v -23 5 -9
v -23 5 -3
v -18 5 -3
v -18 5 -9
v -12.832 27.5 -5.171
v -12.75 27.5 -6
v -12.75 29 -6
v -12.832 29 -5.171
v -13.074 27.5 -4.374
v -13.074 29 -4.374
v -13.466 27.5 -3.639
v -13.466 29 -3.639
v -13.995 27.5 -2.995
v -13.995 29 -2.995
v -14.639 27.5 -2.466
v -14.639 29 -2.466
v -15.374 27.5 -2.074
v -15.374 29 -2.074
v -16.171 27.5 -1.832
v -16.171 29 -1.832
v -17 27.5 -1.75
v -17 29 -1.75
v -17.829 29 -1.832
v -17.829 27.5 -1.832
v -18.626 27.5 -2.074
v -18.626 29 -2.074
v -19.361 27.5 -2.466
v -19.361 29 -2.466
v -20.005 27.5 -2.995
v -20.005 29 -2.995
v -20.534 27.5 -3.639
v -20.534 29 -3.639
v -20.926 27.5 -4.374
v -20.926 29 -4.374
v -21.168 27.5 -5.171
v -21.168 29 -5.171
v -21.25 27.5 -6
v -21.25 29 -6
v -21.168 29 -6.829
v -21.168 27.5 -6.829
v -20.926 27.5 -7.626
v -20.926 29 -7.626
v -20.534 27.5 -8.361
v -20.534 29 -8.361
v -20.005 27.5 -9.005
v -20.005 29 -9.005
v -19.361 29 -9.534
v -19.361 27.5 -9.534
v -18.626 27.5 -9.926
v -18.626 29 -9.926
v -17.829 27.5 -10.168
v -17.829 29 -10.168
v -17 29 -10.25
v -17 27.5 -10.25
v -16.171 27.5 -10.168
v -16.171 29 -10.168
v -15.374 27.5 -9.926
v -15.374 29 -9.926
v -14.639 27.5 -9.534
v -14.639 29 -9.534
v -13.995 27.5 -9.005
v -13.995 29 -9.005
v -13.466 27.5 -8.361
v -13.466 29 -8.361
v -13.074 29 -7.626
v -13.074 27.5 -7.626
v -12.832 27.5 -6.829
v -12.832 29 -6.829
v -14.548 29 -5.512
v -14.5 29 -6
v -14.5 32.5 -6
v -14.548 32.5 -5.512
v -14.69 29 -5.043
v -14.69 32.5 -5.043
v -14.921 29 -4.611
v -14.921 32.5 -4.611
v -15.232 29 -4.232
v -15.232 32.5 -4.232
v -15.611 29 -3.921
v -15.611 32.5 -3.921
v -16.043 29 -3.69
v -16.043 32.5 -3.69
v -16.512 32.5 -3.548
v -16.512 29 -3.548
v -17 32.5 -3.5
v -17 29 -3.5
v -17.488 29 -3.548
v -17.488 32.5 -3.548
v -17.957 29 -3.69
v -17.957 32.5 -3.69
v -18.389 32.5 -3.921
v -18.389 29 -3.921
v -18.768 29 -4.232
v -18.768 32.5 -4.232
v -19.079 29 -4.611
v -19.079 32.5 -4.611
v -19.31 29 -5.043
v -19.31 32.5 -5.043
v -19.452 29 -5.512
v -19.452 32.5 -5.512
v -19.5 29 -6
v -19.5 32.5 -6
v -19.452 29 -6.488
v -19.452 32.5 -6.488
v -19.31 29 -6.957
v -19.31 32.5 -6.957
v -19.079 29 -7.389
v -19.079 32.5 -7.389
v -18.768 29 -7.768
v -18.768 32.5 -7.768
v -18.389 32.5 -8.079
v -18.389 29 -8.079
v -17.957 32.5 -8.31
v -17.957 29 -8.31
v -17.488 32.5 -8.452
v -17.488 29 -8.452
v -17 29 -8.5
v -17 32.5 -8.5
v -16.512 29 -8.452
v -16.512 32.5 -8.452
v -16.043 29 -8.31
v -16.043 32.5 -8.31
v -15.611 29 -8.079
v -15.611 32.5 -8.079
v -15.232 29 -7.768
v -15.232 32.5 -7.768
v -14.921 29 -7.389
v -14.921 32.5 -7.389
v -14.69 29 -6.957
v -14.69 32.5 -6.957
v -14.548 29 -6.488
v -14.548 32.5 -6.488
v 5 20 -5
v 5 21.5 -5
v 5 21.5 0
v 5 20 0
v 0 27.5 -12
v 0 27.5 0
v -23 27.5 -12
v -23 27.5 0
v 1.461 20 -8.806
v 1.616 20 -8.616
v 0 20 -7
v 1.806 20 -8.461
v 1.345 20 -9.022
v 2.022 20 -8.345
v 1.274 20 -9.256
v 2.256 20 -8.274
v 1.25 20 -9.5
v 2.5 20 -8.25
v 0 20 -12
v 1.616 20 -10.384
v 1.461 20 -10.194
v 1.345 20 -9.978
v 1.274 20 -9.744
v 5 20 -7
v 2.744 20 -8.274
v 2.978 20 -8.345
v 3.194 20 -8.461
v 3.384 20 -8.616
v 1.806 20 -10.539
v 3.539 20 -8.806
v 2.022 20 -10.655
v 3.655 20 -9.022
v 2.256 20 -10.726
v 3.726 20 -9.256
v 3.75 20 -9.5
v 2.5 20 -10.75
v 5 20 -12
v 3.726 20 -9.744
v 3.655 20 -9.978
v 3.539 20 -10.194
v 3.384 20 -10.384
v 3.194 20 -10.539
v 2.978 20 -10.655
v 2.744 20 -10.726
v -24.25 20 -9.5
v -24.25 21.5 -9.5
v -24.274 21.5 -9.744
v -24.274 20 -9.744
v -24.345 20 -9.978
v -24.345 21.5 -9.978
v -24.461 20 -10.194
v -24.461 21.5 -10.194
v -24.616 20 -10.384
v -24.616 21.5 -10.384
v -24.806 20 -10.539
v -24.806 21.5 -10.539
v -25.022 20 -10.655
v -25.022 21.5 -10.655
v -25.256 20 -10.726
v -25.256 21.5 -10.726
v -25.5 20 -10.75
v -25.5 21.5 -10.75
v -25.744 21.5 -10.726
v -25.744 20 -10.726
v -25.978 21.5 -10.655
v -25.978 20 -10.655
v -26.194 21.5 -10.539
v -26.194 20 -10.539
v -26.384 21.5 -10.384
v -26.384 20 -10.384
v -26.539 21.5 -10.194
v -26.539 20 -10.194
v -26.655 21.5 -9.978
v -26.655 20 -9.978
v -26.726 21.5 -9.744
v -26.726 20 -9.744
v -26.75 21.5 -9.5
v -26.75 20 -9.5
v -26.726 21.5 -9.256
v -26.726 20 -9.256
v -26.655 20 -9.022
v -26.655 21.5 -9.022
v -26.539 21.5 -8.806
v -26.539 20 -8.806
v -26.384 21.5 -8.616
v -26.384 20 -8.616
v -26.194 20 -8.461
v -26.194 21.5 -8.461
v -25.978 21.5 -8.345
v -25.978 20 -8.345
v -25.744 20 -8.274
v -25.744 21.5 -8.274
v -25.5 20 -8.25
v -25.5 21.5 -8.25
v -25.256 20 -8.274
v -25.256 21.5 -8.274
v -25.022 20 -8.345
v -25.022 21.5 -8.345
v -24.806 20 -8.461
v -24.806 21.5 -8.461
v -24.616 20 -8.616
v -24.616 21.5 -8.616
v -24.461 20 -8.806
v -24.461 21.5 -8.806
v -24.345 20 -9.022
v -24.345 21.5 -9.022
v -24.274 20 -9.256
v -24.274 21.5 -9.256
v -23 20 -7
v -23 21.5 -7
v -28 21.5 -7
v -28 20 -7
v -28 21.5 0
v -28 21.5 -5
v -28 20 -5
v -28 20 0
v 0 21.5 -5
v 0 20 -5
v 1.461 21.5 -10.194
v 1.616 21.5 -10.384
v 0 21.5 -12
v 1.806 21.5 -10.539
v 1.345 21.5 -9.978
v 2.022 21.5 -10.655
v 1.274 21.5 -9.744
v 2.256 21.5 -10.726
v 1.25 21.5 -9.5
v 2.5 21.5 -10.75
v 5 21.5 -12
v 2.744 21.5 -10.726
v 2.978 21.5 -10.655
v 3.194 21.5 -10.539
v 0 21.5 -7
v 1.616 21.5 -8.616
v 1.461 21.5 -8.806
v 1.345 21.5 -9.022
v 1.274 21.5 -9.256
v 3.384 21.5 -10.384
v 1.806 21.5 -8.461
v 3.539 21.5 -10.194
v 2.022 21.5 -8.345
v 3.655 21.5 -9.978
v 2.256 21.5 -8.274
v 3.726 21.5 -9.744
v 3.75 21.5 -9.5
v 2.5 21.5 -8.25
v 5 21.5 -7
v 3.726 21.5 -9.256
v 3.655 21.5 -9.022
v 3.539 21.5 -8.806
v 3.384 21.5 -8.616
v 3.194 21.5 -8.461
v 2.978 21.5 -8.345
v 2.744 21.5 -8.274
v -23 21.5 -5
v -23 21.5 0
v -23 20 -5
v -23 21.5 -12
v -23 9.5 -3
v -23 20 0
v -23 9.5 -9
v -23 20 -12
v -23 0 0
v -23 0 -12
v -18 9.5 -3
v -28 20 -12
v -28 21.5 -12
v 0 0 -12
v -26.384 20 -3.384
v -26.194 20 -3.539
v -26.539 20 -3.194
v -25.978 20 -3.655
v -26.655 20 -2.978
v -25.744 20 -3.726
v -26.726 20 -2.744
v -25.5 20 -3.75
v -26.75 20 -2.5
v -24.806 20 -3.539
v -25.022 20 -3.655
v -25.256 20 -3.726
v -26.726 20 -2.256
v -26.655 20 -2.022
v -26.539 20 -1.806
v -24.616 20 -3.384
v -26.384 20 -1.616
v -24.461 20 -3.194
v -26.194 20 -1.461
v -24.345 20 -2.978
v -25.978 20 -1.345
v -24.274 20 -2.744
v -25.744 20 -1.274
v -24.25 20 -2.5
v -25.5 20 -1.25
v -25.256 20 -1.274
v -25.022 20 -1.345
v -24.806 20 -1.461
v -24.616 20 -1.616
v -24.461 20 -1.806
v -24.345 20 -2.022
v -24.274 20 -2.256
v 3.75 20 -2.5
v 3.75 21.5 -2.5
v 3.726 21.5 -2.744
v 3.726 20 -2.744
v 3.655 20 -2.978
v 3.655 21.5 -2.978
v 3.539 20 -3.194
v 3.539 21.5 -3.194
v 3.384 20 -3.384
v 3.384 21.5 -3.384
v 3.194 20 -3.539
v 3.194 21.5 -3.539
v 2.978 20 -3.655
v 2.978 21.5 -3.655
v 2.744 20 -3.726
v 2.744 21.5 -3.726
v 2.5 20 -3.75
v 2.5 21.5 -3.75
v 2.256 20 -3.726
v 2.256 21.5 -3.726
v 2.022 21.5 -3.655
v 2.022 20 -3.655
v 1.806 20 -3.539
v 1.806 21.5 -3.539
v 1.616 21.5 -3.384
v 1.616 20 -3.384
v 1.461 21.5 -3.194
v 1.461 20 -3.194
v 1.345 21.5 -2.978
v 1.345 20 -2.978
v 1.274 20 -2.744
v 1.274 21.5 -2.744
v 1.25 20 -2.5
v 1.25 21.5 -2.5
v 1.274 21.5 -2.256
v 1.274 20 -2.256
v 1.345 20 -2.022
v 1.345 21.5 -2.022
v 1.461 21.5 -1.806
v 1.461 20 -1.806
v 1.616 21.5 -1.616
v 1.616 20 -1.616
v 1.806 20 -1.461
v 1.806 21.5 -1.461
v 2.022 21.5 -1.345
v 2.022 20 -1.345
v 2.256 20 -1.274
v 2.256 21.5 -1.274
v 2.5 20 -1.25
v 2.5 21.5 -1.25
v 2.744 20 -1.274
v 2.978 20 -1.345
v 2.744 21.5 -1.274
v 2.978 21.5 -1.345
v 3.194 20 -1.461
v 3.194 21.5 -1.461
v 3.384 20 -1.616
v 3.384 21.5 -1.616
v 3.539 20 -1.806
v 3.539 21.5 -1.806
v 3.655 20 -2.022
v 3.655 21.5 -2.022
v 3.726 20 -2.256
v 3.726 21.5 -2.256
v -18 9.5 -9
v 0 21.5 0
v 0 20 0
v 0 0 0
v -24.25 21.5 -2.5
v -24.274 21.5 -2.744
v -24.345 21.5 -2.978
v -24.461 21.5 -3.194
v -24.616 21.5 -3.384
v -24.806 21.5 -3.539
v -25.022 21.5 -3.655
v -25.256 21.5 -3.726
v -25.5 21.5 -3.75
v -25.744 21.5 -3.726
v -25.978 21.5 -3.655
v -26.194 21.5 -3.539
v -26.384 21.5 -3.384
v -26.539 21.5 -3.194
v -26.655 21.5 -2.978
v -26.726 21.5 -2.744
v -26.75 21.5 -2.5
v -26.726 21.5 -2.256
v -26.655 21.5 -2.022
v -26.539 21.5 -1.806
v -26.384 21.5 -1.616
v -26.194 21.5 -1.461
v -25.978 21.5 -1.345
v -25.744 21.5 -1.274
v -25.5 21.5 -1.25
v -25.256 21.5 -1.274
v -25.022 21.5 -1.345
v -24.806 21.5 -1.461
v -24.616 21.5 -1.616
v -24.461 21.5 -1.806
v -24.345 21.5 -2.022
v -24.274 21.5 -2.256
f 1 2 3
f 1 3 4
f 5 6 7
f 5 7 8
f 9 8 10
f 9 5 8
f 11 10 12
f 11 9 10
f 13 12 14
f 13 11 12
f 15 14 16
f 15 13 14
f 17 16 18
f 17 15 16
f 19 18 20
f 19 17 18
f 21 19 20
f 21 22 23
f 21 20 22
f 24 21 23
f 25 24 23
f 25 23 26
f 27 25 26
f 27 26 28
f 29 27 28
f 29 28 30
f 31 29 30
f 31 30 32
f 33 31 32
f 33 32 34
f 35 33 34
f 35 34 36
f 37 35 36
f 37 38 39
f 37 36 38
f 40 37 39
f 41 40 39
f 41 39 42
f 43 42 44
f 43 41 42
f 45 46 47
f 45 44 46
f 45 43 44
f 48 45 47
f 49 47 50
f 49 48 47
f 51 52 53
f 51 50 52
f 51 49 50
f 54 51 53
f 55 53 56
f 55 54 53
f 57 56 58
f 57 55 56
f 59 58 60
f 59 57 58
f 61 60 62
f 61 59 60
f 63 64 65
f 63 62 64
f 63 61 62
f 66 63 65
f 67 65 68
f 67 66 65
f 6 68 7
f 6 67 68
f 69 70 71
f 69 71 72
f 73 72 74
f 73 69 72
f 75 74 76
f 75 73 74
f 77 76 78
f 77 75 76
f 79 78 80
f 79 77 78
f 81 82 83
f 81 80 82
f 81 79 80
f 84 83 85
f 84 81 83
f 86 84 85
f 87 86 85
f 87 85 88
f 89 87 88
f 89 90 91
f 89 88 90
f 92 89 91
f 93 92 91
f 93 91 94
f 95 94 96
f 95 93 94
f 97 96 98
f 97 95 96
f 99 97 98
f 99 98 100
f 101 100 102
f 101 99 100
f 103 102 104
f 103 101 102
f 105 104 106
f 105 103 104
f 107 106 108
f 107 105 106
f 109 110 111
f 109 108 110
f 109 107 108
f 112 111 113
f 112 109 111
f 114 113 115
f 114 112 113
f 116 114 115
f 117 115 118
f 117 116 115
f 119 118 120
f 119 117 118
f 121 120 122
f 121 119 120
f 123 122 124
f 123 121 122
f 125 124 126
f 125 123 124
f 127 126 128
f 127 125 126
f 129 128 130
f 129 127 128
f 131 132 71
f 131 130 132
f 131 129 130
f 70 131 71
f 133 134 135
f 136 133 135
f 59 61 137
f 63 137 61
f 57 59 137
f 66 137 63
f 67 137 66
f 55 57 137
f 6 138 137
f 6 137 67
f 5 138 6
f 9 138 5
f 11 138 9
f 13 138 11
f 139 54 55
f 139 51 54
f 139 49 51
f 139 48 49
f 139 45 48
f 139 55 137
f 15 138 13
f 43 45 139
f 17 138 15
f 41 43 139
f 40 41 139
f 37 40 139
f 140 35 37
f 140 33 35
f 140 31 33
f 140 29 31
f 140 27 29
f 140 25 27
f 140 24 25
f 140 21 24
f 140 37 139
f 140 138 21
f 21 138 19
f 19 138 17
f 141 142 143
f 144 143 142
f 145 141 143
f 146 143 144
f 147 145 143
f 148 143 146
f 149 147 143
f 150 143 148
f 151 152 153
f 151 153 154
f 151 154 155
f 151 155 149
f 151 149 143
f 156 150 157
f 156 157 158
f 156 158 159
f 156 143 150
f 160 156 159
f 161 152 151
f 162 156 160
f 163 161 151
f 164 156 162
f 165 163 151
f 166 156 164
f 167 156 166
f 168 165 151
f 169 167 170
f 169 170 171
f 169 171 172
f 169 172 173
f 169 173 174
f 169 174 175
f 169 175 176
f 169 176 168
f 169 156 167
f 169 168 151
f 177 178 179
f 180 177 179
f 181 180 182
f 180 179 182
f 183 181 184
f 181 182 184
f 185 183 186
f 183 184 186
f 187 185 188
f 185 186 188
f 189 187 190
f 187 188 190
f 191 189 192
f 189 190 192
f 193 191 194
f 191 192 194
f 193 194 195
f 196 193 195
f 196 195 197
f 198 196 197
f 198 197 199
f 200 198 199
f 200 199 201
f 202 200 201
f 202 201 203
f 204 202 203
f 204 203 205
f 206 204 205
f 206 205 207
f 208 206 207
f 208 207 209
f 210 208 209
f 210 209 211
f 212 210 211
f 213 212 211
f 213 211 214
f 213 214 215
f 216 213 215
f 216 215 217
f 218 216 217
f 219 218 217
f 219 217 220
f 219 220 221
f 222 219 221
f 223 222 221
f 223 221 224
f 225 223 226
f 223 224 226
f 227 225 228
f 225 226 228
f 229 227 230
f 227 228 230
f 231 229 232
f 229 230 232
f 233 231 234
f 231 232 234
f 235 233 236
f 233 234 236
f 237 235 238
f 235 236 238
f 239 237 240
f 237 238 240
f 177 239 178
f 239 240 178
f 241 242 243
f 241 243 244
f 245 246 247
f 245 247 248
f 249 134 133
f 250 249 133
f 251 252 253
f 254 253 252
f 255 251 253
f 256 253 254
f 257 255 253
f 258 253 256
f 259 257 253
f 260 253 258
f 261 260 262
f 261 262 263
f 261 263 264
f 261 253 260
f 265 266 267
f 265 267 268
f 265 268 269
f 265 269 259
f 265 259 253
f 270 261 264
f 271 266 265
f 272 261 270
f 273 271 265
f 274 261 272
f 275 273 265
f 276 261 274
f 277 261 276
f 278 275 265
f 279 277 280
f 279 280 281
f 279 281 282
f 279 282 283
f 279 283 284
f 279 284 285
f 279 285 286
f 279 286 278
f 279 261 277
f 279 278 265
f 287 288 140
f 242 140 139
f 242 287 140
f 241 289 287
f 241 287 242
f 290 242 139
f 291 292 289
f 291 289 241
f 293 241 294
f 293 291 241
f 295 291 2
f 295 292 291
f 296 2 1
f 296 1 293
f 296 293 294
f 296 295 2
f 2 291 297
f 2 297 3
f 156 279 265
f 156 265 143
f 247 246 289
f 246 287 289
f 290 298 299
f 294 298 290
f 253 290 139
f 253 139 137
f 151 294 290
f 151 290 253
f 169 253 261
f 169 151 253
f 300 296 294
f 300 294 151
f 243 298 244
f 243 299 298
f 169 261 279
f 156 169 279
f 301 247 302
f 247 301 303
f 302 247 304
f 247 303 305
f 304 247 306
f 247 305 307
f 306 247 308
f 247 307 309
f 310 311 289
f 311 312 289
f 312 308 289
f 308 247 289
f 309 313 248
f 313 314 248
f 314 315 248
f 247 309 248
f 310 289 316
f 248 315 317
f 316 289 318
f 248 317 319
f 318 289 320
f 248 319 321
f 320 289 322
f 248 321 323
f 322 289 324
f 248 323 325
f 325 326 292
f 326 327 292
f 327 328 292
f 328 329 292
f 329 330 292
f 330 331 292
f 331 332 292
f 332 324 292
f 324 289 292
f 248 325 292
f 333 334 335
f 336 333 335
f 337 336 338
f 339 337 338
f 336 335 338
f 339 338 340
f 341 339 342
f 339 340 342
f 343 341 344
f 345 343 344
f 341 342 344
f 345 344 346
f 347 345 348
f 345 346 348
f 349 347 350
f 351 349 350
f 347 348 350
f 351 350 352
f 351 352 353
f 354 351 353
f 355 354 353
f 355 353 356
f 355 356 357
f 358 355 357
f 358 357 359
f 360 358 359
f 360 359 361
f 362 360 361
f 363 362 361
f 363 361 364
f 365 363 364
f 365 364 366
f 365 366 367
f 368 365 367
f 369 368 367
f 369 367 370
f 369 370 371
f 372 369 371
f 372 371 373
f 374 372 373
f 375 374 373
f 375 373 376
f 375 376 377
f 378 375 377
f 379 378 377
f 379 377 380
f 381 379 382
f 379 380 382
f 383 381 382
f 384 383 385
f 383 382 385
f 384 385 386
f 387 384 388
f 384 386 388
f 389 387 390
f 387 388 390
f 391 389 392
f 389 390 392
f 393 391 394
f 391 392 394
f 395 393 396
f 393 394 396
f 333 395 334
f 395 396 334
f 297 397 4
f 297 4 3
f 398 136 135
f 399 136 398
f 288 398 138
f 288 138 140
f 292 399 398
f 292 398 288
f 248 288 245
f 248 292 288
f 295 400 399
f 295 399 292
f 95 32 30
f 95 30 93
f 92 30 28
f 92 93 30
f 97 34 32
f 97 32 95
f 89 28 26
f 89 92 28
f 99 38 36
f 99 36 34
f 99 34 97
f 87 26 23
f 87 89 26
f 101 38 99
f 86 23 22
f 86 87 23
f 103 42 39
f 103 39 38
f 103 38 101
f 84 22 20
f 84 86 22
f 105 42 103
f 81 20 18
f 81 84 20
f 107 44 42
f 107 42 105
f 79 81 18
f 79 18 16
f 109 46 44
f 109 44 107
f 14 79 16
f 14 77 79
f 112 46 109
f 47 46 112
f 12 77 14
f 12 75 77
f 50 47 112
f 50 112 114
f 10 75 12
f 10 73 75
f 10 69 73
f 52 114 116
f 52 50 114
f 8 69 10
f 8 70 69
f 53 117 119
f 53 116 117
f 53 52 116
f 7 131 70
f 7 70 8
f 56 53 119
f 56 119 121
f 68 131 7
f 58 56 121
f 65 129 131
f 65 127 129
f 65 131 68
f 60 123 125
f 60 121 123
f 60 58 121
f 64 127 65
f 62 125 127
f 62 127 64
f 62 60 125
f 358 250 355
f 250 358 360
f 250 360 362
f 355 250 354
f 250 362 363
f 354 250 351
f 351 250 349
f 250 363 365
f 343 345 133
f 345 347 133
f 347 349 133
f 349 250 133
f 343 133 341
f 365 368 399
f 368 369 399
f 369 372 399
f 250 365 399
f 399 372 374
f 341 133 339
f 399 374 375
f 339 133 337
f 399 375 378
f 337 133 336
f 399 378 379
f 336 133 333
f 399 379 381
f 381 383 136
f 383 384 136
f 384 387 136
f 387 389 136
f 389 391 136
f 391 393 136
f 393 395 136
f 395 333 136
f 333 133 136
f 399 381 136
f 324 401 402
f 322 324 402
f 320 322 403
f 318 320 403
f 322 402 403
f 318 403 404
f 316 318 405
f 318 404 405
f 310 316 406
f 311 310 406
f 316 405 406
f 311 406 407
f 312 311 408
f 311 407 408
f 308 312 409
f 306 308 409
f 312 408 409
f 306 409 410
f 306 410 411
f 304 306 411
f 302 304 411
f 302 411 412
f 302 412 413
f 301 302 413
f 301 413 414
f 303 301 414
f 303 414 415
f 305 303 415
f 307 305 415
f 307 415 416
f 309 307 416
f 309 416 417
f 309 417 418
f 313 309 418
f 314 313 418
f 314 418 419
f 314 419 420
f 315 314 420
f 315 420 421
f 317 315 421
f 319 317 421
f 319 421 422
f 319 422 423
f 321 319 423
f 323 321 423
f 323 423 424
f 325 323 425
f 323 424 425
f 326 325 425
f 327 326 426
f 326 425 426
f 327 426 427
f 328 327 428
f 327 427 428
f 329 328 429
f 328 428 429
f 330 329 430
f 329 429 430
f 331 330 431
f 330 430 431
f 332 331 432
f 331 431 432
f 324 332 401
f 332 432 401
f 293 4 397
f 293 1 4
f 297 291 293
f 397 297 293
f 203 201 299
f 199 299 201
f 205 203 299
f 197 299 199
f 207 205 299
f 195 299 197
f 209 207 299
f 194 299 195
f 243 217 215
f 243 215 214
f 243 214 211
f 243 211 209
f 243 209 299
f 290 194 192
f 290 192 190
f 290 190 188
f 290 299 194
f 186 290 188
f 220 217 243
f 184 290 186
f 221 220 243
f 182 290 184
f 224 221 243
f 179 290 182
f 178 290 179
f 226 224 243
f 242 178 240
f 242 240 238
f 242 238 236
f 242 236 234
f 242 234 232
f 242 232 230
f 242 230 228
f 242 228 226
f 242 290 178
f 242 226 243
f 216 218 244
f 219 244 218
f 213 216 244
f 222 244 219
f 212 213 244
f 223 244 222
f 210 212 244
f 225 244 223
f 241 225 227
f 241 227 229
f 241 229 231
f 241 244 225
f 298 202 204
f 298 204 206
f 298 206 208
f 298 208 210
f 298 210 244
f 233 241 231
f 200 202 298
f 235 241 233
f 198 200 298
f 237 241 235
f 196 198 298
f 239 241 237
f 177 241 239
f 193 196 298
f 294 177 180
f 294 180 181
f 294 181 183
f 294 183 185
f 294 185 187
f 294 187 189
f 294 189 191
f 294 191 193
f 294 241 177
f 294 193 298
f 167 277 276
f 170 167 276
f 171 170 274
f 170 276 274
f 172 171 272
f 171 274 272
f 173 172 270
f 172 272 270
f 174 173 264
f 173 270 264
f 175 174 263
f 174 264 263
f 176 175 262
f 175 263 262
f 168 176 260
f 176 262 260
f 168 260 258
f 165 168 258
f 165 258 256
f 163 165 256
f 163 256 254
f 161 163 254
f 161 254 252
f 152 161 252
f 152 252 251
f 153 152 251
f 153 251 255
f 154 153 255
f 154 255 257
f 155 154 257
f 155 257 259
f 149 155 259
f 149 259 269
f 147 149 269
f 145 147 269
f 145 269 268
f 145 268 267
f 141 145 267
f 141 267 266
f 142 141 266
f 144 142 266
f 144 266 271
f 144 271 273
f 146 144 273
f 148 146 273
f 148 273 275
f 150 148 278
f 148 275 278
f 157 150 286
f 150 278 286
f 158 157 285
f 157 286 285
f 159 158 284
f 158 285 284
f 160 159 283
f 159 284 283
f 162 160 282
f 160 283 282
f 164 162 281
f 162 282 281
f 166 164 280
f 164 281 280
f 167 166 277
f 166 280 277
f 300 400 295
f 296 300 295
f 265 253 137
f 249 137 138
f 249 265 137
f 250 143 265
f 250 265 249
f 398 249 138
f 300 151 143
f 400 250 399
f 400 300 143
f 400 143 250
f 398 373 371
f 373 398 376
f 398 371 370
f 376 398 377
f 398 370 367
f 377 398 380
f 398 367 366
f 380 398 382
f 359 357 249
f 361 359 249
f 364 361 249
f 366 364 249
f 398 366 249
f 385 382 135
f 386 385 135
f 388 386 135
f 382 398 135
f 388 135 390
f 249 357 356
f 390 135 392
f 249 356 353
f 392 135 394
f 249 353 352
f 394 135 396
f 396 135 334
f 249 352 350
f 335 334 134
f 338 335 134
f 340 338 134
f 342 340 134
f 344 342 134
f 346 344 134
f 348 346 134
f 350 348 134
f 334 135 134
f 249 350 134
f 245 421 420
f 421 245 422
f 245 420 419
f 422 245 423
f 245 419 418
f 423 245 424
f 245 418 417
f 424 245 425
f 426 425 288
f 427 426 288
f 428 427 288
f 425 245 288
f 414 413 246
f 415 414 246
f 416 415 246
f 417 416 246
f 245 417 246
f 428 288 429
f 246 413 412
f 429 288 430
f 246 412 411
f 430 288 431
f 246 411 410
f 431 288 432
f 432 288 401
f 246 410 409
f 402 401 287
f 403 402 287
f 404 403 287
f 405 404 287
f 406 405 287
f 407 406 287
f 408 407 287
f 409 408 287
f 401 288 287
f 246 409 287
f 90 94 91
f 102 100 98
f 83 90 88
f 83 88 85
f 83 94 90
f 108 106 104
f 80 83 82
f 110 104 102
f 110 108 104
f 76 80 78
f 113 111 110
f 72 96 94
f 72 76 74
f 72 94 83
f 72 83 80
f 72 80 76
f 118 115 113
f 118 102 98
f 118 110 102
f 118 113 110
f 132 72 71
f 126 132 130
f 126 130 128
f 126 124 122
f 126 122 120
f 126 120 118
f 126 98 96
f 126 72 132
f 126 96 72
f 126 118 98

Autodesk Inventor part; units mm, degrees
ref_plane "YZ Plane" through (0, 0, 0) normal (1, 0, 0) x (0, 1, 0)
ref_plane "XZ Plane" through (0, 0, 0) normal (0, 1, 0) x (-1, 0, 0)
ref_plane "XY Plane" through (0, 0, 0) normal (0, 0, 1) x (1, 0, 0)
sketch "Boceto1" plane through (0, 0, 0) normal (0, 1, 0) x (-1, 0, 0)
  line L0 (0, 0) -> (23, 0)
  line L1 (23, 0) -> (23, -12)
  line L2 (23, -12) -> (0, -12)
  line L3 (0, -12) -> (0, 0)
  dimension "d0" = 23
  dimension "d1" = 12
extrude "Extrusión1" add sketch "Boceto1" along normal blind 27.5
sketch "Boceto2" plane through (0, 27.5, 0) normal (0, 1, 0) x (1, 0, 0)
  line L0 (0, 0) -> (0, 12) projected
  line L1 (0, 0) -> (0, 12)
  line L2 (0, 6) -> (-17, 6)
  circle A0 centre (-17, 6) radius 4.25
  circle A1 centre (-17, 6) radius 2.5
  dimension "d4" = 17
  dimension "d5" = 8.5
  dimension "d6" = 5
extrude "Extrusión2" add sketch "Boceto2" along normal blind 5 contours A1
sketch "Boceto3" plane through (0, 27.5, 0) normal (0, 1, 0) x (1, 0, 0)
  circle A0 centre (-17, 6) radius 2.5 projected
  circle A1 centre (-17, 6) radius 4.25
  point P0 (0, 0)
  dimension "d9" = 8.5
extrude "Extrusión3" add sketch "Boceto3" along normal blind 1.5
sketch "Boceto4" plane through (-23, 0, -12) normal (-1, 0, 0) x (0, 0, 1)
  line L0 (12, 0) -> (12, 27.5) projected
  line L1 (12, 27.5) -> (12, 20)
  line L2 (12, 20) -> (12, 21.5)
  line L3 (0, 0) -> (0, 27.5) projected
  line L4 (12, 21.5) -> (7, 21.5)
  line L5 (7, 21.5) -> (7, 20)
  line L6 (7, 20) -> (12, 20)
  line L7 (0, 21.5) -> (5, 21.5)
  line L8 (5, 21.5) -> (5, 20)
  line L9 (5, 20) -> (0, 20)
  line L10 (0, 21.5) -> (0, 20)
  dimension "d12" = 7.5
  dimension "d13" = 1.5
  dimension "d14" = 5
  dimension "d15" = 5
extrude "Extrusión4" add sketch "Boceto4" along normal blind 5 and the other way blind 28
sketch "Boceto5" plane through (-23, 21.5, -7) normal (0, 1, 0) x (1, 0, 0)
  line L0 (-5, 0) -> (-5, 5) projected
  line L1 (-5, 2.5) -> (0, 2.5)
  line L2 (0, -7) -> (0, 5) projected
  circle A0 centre (-2.5, 2.5) radius 1.25
  circle A1 centre (-2.5, -4.5) radius 1.25
  line L3 (28, 0) -> (28, 5) projected
  line L4 (28, 2.5) -> (23, 2.5)
  circle A2 centre (25.5, 2.5) radius 1.25
  circle A3 centre (25.5, -4.5) radius 1.25
  point P0 (23, -7)
  dimension "d20" = 2.5
  dimension "d21" = 2.5
  dimension "d22" = 2.5
  dimension "d23" = 2.5
extrude "Extrusión5" cut sketch "Boceto5" against normal blind 5
sketch "Boceto6" plane through (-23, 0, -12) normal (-1, 0, 0) x (0, 0, 1)
  line L0 (12, 0) -> (12, 20) projected
  line L1 (12, 20) -> (12, 9.5)
  line L2 (12, 9.5) -> (0, 9.5)
  line L3 (0, 0) -> (0, 20) projected
  line L4 (6, 9.5) -> (9, 9.5)
  line L5 (9, 9.5) -> (9, 5)
  line L6 (9, 5) -> (3, 5)
  line L7 (3, 5) -> (3, 9.5)
  dimension "d26" = 10.5
  dimension "d27" = 3
  dimension "d28" = 4.5
  dimension "d29" = 6
extrude "Extrusión6" cut sketch "Boceto6" against normal blind 5
properties part number "microservo_FT_2322"
